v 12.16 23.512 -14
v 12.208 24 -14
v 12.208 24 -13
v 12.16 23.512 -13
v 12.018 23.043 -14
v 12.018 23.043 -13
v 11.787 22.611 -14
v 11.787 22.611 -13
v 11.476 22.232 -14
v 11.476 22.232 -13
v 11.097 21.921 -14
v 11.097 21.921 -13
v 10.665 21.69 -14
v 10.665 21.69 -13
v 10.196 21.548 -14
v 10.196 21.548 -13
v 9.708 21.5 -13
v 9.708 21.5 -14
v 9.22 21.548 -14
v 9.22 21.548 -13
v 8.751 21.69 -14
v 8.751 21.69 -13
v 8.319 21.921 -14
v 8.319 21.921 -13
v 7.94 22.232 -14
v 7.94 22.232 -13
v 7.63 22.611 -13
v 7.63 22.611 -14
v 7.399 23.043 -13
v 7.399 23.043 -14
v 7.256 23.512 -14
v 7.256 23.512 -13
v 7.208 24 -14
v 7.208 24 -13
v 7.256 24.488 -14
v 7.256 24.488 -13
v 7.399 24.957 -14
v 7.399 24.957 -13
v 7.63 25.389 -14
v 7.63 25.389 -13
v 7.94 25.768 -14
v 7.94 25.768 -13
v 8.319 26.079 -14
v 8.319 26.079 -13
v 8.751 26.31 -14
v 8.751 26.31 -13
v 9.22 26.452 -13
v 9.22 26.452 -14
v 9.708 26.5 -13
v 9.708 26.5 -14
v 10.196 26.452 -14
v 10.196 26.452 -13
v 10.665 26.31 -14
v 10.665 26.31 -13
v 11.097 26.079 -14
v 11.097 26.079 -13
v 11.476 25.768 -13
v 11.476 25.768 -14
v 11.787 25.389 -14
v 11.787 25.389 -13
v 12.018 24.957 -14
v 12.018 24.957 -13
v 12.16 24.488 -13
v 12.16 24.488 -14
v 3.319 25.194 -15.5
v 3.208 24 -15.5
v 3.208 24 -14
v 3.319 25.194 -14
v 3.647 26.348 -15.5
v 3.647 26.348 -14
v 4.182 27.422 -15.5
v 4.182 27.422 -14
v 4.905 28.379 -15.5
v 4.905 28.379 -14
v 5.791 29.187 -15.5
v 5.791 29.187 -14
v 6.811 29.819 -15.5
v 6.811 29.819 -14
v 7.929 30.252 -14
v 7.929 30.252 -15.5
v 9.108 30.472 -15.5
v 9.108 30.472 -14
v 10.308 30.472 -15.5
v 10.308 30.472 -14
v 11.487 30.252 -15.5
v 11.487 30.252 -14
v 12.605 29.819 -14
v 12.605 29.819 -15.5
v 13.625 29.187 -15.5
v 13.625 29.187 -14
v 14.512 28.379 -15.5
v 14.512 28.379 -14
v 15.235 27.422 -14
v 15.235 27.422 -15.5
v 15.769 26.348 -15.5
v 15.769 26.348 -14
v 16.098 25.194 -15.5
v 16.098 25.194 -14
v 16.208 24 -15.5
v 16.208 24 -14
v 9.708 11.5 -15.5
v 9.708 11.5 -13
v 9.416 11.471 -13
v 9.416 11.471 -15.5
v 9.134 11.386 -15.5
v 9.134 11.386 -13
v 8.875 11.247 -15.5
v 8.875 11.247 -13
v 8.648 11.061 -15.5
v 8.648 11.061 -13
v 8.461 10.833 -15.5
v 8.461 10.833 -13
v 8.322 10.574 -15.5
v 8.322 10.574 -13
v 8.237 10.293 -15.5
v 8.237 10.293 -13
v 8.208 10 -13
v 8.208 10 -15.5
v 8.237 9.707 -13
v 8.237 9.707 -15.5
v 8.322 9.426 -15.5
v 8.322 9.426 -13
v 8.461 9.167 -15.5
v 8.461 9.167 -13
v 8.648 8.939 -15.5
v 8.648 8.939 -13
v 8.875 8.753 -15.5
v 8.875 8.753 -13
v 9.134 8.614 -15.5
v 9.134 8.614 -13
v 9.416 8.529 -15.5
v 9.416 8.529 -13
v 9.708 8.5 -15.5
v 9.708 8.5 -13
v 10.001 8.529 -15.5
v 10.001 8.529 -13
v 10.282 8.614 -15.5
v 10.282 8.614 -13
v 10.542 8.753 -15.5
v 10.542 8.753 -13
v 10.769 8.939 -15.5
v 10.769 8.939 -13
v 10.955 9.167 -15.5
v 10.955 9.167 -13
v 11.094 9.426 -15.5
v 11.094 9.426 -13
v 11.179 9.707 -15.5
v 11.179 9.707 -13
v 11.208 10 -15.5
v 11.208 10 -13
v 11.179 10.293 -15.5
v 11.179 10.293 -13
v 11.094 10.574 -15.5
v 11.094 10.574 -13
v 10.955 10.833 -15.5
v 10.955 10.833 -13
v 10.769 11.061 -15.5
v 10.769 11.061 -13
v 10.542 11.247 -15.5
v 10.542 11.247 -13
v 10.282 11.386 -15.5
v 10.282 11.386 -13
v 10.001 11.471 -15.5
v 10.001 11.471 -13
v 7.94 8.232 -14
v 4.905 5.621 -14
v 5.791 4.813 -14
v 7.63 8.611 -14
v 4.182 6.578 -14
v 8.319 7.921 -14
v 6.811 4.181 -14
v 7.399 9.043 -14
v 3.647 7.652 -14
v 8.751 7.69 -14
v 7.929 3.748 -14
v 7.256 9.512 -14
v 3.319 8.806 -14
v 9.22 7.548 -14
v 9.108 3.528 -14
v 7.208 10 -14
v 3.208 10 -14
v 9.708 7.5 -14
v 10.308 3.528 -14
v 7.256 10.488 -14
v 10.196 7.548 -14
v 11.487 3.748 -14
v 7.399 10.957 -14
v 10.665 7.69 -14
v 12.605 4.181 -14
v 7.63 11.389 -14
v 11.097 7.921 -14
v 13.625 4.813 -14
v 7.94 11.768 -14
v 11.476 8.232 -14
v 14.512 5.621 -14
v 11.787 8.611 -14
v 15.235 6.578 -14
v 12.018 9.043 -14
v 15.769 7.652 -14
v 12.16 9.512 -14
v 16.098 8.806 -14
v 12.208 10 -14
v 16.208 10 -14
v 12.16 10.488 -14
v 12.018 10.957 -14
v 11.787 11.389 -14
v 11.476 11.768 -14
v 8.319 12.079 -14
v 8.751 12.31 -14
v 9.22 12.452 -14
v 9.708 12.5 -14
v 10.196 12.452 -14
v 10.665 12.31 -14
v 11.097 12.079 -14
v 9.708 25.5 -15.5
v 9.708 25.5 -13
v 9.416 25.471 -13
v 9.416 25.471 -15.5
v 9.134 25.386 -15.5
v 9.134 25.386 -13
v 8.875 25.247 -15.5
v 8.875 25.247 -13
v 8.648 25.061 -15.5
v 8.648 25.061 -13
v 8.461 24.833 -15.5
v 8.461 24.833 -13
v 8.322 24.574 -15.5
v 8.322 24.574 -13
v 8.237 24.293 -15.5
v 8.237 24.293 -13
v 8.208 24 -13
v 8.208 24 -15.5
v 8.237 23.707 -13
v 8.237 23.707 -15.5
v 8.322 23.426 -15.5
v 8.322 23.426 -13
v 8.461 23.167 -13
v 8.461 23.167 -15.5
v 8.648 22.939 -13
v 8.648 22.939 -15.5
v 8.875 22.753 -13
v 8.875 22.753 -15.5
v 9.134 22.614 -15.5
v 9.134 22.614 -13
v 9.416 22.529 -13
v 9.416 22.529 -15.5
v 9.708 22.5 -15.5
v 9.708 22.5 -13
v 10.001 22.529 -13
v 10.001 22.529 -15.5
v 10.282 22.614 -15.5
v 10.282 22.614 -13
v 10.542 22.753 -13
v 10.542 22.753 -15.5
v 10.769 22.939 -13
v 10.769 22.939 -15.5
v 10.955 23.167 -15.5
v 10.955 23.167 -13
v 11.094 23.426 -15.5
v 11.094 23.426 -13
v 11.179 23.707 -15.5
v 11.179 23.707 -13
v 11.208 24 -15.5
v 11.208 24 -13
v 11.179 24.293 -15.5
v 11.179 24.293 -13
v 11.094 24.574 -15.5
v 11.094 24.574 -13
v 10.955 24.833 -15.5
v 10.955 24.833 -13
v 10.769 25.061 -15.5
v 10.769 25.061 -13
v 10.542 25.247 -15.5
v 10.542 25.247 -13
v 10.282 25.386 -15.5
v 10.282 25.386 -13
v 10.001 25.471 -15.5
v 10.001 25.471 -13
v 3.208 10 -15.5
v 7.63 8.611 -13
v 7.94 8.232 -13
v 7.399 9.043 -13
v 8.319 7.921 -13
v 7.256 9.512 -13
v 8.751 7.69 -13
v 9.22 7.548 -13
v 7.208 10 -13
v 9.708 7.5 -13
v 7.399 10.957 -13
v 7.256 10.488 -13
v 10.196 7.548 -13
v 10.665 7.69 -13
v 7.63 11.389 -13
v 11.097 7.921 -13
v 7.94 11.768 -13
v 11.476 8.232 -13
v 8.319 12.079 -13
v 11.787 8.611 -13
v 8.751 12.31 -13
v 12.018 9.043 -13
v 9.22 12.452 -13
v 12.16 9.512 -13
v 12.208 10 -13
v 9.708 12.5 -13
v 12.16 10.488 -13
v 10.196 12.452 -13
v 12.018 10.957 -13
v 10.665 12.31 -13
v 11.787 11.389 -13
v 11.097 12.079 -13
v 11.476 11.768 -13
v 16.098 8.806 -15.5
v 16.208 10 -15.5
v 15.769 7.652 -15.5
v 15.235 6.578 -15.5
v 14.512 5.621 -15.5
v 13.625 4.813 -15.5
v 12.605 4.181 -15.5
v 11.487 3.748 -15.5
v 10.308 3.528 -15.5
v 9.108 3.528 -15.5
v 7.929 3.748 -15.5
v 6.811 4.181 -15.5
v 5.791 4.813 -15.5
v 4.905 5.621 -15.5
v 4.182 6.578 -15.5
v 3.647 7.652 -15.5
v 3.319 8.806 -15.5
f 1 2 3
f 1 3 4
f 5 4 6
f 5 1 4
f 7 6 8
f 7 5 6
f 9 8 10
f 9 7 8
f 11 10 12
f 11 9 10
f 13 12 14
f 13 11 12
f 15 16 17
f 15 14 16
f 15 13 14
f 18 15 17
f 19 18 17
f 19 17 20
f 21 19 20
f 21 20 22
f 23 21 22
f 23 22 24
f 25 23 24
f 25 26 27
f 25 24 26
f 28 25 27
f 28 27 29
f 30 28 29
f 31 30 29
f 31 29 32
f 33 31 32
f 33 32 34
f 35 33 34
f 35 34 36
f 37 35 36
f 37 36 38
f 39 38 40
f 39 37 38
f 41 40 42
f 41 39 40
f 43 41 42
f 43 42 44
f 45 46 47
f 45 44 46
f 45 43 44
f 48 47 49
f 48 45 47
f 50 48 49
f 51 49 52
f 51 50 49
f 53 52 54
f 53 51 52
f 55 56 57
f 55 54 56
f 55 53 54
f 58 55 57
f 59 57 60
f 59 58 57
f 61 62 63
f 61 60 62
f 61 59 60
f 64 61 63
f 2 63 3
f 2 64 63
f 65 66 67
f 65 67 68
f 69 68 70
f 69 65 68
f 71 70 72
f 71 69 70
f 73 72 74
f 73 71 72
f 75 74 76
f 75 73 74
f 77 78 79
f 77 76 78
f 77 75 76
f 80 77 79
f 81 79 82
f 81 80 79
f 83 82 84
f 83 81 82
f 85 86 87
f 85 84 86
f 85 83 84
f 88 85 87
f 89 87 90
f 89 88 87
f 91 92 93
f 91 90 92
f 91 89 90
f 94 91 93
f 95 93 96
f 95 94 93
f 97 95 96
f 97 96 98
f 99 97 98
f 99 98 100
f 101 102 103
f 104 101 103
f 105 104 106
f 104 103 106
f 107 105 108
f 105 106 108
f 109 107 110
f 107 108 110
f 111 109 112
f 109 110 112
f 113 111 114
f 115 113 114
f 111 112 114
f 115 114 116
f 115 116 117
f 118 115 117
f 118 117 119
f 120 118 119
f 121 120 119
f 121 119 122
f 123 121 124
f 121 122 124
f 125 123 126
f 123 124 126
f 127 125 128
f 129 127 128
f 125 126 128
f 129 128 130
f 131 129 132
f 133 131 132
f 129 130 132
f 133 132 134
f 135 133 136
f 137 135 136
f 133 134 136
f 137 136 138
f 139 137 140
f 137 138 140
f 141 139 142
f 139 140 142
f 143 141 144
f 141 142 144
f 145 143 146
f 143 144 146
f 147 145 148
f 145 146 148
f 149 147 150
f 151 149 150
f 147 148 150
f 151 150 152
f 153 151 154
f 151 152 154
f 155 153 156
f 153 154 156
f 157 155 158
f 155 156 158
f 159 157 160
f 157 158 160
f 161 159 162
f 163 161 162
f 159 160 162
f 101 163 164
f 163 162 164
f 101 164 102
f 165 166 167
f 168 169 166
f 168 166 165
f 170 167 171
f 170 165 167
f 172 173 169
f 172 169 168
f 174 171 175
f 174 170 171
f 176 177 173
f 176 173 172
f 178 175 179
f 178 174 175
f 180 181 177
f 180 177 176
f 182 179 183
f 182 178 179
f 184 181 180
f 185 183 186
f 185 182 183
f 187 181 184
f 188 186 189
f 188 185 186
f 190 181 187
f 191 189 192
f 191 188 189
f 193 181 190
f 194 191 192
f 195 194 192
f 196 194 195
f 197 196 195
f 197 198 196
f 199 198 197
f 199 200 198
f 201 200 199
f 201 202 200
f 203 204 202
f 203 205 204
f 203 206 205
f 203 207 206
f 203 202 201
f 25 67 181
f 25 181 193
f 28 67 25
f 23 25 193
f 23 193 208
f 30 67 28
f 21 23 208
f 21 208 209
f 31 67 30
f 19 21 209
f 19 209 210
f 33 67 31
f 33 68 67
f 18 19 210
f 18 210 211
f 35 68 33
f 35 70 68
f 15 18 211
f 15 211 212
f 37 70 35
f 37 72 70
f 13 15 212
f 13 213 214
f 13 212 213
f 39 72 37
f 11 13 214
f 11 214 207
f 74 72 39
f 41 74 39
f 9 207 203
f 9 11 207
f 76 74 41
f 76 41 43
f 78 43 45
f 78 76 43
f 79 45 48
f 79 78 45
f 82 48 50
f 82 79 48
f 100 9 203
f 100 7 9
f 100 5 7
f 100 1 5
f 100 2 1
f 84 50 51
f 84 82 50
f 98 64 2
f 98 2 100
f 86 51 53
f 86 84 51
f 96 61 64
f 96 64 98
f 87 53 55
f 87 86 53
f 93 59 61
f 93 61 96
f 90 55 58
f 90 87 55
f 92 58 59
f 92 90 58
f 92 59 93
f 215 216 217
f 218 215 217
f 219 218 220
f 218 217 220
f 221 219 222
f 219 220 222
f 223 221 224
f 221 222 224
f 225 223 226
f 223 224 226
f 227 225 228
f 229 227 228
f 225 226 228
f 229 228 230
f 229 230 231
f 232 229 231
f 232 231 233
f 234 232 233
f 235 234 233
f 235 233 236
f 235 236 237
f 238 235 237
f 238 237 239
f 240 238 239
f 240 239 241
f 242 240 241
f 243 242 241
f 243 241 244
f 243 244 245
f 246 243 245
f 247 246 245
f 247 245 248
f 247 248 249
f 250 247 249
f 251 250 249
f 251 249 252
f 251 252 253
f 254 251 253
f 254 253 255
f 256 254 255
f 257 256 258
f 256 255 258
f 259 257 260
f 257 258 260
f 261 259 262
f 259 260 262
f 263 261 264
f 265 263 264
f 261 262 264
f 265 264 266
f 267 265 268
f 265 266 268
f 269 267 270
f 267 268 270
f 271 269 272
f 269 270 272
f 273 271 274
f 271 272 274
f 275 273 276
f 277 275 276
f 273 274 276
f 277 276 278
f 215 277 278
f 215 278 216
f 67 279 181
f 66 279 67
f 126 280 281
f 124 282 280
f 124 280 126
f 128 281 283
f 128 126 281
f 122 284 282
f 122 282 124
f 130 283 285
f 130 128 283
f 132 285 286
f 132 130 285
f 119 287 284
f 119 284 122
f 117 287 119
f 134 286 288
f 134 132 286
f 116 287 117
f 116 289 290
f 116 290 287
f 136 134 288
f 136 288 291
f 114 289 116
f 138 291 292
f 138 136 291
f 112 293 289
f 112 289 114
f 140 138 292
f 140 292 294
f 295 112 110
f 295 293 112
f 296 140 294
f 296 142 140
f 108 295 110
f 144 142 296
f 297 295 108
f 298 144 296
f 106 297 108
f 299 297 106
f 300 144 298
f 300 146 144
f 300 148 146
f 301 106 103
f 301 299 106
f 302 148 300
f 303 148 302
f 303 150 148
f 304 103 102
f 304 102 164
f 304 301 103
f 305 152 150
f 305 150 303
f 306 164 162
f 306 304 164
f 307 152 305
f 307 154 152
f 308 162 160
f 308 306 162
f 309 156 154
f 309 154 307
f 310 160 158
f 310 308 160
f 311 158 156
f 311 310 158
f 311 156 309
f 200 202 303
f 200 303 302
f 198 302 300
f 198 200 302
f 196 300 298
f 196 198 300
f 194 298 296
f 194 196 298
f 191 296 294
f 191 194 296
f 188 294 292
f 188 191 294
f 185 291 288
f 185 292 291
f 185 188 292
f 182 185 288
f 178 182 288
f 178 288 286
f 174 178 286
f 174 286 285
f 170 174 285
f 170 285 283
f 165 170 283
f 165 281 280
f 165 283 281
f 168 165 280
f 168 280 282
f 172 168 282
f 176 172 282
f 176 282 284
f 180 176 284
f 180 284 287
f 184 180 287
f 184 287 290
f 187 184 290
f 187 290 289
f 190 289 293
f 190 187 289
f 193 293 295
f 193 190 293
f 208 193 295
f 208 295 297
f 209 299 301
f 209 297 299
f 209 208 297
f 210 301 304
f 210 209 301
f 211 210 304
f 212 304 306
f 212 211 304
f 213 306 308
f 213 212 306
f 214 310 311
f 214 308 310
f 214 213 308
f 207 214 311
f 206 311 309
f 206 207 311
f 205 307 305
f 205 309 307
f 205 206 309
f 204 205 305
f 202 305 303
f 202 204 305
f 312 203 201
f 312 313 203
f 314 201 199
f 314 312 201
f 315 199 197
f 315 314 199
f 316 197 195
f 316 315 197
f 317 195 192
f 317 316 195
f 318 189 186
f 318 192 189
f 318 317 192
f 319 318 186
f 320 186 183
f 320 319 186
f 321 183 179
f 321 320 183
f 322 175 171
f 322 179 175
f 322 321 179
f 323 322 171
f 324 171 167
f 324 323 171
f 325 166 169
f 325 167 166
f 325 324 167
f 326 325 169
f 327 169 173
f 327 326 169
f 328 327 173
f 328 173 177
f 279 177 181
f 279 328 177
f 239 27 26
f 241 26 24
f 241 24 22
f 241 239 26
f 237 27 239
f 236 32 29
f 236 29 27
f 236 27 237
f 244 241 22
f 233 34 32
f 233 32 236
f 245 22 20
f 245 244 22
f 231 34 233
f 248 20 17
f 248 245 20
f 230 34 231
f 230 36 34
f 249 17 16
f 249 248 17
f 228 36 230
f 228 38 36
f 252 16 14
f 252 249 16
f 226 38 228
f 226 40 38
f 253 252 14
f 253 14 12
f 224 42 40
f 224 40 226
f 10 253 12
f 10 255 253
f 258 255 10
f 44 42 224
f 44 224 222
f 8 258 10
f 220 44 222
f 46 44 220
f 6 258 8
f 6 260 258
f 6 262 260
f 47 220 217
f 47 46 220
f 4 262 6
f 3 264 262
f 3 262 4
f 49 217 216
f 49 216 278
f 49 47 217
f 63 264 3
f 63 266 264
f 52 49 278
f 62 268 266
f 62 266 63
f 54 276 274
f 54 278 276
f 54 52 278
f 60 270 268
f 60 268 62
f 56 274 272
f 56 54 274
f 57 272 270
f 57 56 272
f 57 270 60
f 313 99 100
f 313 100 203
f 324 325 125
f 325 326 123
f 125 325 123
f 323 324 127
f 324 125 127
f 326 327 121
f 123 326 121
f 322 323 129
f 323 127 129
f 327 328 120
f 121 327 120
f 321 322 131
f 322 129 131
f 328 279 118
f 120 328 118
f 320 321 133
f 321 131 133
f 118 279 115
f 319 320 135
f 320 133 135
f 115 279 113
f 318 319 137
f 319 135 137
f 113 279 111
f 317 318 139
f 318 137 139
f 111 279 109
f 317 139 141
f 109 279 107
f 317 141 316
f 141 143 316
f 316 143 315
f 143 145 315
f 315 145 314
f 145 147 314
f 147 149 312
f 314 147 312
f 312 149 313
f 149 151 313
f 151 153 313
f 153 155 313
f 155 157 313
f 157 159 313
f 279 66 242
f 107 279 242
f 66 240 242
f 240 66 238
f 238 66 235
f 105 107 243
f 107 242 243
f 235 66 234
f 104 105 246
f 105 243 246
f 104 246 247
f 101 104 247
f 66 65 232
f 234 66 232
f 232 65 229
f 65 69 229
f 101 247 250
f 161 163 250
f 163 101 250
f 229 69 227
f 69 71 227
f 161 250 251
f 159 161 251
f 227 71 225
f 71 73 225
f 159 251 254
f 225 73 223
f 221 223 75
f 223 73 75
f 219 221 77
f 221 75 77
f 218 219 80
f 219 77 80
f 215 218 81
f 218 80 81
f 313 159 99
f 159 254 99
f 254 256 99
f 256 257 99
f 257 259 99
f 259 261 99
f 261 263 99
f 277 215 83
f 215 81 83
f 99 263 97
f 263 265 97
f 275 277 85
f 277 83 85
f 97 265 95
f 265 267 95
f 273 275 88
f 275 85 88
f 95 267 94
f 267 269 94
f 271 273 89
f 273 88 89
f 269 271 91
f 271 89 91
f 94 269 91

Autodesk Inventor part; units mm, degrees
ref_plane "YZ Plane" through (0, 0, 0) normal (1, 0, 0) x (0, 1, 0)
ref_plane "XZ Plane" through (0, 0, 0) normal (0, 1, 0) x (-1, 0, 0)
ref_plane "Work Plane1" through (0, 0, -15.5) normal (0, 0, 1) x (1, 0, 0)
sketch "Sketch1" plane through (0, 0, -15.5) normal (0, 0, 1) x (1, 0, 0)
  arc A0 (3.2082, 10) -> (16.2082, 10) centre (9.7082, 10) ccw
  line L0 (16.2082, 24) -> (16.2082, 10)
  line L1 (3.2082, 10) -> (3.2082, 24)
  arc A1 (16.2082, 24) -> (3.2082, 24) centre (9.7082, 24) ccw
extrude "Extrusion3" add sketch "Sketch1" along normal blind 1.5
sketch "Sketch2" plane through (0, 0, -14) normal (0, 0, 1) x (1, 0, 0)
  circle A0 centre (9.7082, 10) radius 2.5
extrude "Extrusion2" add sketch "Sketch2" along normal blind 1
sketch "Sketch3" plane through (0, 0, -14) normal (0, 0, 1) x (1, 0, 0)
  circle A0 centre (9.7082, 24) radius 2.5
extrude "Extrusion1" add sketch "Sketch3" along normal blind 1
hole "Hole2" at (9.7082, 10, -15.5) direction (0, 0, 1) diameter 3 depth 2.5
sketch "Sketch4" plane through (0, 0, -15.5) normal (0, 0, 1) x (1, 0, 0)
  point P0 (9.7082, 10)
hole "Hole1" at (9.7082, 24, -15.5) direction (0, 0, 1) diameter 3 depth 2.5
sketch "Sketch5" plane through (0, 0, -15.5) normal (0, 0, 1) x (1, 0, 0)
  point P0 (9.7082, 24)
